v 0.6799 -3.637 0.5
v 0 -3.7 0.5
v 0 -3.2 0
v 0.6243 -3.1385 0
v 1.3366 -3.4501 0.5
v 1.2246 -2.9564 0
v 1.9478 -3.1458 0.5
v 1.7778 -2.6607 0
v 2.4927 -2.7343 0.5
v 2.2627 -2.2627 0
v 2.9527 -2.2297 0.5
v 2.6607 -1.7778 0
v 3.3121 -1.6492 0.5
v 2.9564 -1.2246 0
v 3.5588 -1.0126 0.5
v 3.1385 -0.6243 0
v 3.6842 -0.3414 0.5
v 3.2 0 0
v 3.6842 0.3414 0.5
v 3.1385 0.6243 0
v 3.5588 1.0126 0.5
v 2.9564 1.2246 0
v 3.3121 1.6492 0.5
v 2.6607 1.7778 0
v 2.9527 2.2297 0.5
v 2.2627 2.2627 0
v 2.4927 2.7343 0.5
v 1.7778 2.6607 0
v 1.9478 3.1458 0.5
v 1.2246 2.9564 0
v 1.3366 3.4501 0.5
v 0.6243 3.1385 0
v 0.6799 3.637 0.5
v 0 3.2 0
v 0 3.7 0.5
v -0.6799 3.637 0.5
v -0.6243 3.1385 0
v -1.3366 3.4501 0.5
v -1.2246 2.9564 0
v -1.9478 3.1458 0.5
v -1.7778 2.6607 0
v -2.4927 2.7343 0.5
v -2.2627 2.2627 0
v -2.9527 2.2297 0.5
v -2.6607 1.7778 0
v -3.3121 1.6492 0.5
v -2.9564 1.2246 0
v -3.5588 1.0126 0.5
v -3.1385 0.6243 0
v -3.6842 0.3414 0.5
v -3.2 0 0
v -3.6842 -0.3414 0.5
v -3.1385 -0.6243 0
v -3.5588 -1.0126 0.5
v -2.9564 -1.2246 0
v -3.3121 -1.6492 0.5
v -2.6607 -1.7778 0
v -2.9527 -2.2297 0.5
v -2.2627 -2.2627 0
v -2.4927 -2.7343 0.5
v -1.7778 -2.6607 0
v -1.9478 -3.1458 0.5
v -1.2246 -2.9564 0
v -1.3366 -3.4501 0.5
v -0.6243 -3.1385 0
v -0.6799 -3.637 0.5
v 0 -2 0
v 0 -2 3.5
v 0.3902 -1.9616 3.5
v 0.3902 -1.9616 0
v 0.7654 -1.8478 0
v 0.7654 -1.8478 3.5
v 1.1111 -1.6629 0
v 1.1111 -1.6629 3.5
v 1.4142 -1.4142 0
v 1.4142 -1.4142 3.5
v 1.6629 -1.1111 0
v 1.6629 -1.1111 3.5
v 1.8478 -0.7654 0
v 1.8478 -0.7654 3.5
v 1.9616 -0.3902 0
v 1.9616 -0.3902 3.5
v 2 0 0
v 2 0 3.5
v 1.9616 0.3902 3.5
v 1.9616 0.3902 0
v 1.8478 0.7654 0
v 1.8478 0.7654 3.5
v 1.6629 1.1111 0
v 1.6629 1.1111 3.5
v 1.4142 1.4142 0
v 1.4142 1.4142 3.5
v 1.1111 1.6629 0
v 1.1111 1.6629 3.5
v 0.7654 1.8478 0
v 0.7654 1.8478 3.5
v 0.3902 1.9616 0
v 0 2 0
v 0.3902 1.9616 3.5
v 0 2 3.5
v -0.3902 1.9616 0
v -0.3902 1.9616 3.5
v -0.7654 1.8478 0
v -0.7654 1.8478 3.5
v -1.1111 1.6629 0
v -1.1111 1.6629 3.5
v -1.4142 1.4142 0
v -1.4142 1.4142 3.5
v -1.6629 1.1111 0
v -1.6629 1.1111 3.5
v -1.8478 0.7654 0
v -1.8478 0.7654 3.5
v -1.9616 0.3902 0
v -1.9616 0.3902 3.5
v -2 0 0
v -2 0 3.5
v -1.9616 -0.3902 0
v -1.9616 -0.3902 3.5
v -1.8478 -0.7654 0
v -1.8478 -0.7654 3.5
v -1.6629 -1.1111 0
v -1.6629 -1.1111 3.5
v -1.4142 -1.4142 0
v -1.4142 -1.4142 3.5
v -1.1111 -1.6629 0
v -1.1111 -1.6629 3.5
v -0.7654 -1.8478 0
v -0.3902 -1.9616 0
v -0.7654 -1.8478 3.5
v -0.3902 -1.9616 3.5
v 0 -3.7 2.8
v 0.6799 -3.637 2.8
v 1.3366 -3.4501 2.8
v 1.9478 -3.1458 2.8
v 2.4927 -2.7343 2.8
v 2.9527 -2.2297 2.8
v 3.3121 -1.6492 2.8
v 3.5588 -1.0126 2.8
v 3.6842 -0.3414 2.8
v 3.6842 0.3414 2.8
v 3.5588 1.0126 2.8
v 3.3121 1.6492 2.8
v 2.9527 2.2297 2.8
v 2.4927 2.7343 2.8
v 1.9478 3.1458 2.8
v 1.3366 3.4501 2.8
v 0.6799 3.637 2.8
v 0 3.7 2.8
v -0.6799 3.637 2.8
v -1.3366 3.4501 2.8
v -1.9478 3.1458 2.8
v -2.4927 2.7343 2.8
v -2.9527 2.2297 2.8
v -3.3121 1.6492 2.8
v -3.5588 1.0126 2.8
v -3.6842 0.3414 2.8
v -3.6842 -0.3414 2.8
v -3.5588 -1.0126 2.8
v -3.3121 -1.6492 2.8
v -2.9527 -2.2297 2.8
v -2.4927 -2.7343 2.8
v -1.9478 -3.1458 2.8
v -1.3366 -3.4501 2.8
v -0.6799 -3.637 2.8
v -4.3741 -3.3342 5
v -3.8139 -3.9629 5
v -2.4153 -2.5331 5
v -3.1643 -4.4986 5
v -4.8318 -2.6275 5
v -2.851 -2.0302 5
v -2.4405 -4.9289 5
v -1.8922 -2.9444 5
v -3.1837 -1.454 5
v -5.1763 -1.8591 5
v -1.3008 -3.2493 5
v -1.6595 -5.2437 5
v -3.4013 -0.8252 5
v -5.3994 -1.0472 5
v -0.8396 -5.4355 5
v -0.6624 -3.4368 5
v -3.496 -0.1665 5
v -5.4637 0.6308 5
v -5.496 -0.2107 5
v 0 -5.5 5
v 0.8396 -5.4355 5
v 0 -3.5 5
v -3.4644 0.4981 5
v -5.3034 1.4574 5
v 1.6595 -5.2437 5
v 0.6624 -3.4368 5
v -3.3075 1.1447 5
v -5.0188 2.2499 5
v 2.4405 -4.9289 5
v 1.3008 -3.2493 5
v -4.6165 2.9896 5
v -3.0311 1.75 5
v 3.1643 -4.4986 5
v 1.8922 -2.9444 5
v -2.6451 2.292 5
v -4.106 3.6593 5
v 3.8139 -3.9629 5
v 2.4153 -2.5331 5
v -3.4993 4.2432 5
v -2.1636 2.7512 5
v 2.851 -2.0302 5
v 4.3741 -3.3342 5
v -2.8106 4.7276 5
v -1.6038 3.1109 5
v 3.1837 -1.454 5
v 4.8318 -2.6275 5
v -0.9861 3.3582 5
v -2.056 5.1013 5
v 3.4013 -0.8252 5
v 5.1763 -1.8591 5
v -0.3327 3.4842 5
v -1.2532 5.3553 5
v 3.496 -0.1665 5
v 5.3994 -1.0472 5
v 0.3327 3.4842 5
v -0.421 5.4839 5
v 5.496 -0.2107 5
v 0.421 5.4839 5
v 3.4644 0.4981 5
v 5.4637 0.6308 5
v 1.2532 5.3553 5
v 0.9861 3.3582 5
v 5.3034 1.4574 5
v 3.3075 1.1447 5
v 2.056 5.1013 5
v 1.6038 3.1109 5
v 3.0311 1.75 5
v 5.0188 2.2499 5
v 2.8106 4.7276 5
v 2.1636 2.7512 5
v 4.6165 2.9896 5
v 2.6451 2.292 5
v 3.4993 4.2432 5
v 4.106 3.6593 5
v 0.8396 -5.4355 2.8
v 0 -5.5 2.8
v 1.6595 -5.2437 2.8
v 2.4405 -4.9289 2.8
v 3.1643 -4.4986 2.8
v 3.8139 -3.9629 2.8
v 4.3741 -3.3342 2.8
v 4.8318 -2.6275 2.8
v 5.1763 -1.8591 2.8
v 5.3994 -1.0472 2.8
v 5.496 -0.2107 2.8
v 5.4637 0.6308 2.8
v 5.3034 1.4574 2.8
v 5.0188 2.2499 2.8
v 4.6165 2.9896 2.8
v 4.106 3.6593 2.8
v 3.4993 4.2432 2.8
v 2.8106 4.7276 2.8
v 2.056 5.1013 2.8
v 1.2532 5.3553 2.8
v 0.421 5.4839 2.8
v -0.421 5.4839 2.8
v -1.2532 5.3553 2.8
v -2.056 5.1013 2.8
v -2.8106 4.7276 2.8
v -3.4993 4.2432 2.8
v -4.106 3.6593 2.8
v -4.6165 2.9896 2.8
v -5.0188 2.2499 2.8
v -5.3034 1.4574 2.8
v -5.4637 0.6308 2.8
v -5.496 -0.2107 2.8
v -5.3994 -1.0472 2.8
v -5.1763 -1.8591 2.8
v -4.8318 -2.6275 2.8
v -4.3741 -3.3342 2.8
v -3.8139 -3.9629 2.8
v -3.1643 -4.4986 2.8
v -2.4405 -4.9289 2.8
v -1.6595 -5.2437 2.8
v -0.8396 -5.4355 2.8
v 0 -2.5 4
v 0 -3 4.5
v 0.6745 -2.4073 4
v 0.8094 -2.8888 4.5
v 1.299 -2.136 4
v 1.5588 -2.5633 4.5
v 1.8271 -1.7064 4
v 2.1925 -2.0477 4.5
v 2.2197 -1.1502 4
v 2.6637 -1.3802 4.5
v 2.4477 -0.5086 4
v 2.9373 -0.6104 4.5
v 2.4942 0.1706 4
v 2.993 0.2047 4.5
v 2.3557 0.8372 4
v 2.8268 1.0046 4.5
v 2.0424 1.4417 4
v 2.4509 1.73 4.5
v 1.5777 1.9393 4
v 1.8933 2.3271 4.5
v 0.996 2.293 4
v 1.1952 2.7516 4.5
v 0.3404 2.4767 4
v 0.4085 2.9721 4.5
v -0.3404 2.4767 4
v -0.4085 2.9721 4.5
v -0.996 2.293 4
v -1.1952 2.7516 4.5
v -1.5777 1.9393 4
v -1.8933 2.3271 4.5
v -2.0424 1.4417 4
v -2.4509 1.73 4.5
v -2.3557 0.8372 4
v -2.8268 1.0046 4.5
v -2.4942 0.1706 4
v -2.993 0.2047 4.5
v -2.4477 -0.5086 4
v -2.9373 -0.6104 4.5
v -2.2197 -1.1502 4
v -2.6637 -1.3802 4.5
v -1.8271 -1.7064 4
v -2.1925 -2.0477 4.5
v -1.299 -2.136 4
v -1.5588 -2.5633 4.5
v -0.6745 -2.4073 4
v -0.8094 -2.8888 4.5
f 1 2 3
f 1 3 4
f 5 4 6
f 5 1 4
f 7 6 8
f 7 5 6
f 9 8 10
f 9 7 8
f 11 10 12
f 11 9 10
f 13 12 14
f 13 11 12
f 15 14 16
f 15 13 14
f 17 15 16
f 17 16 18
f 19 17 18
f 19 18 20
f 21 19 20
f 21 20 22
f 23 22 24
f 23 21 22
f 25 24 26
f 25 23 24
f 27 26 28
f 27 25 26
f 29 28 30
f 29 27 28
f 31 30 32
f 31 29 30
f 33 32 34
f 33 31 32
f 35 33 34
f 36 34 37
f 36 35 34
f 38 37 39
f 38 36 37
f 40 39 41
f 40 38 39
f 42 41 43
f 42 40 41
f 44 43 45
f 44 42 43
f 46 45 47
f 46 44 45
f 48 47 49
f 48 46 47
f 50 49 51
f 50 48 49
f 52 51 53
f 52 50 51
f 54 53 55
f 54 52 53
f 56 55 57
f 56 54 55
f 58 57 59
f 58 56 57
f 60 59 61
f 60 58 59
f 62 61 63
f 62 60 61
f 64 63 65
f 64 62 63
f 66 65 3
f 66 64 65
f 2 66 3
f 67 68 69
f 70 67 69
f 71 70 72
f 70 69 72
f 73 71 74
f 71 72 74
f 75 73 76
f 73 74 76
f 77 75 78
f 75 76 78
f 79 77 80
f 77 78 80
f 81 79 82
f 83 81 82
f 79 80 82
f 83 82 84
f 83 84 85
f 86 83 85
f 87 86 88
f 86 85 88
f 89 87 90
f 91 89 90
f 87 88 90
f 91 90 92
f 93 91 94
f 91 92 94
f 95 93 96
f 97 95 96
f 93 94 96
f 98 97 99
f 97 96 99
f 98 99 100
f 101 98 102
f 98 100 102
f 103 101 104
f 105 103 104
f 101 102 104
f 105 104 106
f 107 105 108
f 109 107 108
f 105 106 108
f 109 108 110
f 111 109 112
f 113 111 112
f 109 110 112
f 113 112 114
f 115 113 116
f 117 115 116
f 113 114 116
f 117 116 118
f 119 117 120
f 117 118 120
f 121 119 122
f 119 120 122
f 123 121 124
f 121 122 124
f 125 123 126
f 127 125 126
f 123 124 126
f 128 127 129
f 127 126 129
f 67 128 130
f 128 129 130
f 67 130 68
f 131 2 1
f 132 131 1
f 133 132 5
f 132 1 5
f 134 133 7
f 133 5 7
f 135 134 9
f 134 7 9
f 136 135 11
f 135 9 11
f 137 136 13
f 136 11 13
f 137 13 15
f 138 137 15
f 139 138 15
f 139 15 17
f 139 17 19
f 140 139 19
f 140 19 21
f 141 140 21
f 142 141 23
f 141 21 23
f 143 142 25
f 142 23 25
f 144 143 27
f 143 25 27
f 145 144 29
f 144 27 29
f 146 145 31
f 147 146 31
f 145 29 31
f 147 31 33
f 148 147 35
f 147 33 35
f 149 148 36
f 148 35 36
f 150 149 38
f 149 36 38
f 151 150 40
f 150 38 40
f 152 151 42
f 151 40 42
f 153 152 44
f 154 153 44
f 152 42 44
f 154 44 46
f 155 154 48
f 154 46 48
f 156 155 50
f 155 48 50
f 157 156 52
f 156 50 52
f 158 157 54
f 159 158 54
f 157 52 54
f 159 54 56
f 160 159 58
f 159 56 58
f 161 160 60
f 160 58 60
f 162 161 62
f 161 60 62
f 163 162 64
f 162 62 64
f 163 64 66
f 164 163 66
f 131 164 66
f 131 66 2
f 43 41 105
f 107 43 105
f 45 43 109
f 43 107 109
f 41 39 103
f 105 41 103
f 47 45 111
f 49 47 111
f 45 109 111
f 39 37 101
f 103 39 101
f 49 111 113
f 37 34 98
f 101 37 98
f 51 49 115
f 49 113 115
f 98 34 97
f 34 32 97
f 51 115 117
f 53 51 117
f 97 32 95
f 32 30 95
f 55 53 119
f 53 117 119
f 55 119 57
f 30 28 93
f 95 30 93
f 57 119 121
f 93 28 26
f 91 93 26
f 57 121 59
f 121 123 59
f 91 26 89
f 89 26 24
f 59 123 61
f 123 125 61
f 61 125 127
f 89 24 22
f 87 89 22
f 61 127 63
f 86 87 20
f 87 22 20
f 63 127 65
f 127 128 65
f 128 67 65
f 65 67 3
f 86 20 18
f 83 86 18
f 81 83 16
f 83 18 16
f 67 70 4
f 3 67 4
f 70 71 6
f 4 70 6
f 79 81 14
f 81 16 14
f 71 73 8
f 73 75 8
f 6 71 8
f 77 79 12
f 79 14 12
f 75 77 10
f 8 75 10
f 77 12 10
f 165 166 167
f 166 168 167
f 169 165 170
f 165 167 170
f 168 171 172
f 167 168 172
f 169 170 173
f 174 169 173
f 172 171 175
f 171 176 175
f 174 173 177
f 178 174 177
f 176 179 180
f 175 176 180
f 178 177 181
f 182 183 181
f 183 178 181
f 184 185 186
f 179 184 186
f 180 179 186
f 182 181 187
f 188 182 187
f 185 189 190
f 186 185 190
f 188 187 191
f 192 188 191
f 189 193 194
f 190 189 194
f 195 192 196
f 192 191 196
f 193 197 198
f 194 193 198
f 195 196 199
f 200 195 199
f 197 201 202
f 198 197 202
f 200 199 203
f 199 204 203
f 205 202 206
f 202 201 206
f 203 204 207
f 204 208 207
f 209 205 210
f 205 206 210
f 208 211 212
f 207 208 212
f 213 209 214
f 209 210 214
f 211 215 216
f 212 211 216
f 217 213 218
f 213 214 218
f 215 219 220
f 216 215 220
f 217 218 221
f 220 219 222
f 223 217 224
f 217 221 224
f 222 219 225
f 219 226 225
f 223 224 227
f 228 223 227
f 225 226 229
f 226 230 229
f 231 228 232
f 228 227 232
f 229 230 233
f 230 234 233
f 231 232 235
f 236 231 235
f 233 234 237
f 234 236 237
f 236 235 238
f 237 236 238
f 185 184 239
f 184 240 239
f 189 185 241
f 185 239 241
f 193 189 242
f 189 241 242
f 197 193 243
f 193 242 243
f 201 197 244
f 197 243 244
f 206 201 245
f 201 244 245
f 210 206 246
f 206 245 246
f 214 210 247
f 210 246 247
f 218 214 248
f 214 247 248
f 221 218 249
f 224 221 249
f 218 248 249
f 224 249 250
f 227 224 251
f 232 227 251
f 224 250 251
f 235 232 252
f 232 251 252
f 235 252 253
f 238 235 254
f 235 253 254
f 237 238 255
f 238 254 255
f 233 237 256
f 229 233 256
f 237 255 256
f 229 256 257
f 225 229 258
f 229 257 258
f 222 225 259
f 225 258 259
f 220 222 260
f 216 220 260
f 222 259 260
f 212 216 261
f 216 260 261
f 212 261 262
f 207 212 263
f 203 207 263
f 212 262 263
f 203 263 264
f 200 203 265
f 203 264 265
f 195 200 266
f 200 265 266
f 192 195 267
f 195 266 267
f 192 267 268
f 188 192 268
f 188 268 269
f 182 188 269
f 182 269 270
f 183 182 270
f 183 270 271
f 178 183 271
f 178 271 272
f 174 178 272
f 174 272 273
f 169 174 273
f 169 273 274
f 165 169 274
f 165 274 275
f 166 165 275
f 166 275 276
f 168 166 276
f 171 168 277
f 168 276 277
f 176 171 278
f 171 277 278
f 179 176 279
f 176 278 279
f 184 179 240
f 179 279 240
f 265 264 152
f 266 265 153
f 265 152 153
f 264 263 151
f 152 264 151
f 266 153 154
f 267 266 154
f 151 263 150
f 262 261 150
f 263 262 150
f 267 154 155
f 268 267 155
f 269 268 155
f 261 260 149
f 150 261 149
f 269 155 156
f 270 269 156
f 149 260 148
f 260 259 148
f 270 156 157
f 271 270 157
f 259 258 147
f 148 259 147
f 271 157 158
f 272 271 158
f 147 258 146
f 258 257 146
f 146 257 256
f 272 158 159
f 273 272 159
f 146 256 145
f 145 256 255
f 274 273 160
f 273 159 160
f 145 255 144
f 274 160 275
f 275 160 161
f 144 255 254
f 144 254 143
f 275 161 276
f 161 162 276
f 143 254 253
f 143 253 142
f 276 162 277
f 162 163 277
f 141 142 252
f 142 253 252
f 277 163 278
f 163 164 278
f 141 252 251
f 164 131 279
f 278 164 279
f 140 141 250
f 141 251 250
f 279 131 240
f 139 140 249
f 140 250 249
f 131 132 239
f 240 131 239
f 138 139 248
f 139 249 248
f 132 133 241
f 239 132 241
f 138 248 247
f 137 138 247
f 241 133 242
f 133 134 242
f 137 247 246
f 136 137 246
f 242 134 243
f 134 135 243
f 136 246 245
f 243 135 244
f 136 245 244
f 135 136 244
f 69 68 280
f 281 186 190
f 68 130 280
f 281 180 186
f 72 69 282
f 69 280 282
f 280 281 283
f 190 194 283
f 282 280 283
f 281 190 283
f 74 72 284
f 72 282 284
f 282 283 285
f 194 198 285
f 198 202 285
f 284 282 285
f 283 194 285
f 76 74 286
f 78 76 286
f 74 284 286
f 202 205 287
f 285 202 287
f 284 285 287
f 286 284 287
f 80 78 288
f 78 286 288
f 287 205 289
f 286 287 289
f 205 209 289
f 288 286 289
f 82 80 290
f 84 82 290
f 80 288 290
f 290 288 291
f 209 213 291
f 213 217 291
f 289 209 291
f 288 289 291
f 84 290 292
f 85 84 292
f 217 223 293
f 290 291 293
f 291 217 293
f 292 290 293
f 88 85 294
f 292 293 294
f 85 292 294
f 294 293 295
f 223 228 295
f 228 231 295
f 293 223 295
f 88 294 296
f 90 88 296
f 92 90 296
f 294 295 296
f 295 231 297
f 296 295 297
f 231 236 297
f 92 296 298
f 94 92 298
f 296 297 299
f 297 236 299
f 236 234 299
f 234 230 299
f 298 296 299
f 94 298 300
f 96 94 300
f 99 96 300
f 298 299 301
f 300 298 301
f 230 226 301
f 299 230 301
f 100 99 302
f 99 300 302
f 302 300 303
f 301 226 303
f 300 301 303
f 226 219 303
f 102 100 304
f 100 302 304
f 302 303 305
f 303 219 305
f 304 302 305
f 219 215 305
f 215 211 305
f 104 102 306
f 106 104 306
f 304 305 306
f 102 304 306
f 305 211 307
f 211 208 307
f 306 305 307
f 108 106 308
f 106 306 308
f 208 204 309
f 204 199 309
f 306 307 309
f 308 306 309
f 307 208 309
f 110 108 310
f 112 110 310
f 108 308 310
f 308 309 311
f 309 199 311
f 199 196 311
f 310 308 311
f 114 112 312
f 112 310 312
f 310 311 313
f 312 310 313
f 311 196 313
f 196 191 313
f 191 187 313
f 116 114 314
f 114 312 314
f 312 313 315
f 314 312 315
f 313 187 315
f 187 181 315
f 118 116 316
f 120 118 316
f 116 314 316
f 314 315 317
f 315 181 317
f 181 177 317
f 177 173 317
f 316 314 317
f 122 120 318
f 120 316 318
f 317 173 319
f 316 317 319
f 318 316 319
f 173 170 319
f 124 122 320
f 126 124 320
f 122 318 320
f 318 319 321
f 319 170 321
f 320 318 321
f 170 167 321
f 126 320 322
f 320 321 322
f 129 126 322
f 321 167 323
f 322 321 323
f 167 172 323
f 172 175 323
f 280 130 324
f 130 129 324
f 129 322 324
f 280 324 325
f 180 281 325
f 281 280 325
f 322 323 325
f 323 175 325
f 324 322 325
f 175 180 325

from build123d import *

# Parameters (mm, degrees)
F2_SIZE = 1.5
F3_SIZE = 0.5


with BuildPart() as f1:
    # F0 (on Right) → F1 (revolve)
    with BuildSketch(Plane.YZ):
        Polygon((-3.7, 0), (-2, 0), (-2, 5), (-5.5, 5), (-5.5, 2.8), (-3.7, 2.8), align=None)
    revolve(axis=Axis((0, 0, 4.618393), (0, 0, 1)))

    # F2
    f2_edges = [f1.edges().sort_by_distance(p)[0] for p in [
        (0, 2, 5),
    ]]
    chamfer(f2_edges, length=F2_SIZE)

    # F3
    f3_edges = [f1.edges().sort_by_distance(p)[0] for p in [
        (0, 3.7, 0),
    ]]
    chamfer(f3_edges, length=F3_SIZE)


solid = f1.part
